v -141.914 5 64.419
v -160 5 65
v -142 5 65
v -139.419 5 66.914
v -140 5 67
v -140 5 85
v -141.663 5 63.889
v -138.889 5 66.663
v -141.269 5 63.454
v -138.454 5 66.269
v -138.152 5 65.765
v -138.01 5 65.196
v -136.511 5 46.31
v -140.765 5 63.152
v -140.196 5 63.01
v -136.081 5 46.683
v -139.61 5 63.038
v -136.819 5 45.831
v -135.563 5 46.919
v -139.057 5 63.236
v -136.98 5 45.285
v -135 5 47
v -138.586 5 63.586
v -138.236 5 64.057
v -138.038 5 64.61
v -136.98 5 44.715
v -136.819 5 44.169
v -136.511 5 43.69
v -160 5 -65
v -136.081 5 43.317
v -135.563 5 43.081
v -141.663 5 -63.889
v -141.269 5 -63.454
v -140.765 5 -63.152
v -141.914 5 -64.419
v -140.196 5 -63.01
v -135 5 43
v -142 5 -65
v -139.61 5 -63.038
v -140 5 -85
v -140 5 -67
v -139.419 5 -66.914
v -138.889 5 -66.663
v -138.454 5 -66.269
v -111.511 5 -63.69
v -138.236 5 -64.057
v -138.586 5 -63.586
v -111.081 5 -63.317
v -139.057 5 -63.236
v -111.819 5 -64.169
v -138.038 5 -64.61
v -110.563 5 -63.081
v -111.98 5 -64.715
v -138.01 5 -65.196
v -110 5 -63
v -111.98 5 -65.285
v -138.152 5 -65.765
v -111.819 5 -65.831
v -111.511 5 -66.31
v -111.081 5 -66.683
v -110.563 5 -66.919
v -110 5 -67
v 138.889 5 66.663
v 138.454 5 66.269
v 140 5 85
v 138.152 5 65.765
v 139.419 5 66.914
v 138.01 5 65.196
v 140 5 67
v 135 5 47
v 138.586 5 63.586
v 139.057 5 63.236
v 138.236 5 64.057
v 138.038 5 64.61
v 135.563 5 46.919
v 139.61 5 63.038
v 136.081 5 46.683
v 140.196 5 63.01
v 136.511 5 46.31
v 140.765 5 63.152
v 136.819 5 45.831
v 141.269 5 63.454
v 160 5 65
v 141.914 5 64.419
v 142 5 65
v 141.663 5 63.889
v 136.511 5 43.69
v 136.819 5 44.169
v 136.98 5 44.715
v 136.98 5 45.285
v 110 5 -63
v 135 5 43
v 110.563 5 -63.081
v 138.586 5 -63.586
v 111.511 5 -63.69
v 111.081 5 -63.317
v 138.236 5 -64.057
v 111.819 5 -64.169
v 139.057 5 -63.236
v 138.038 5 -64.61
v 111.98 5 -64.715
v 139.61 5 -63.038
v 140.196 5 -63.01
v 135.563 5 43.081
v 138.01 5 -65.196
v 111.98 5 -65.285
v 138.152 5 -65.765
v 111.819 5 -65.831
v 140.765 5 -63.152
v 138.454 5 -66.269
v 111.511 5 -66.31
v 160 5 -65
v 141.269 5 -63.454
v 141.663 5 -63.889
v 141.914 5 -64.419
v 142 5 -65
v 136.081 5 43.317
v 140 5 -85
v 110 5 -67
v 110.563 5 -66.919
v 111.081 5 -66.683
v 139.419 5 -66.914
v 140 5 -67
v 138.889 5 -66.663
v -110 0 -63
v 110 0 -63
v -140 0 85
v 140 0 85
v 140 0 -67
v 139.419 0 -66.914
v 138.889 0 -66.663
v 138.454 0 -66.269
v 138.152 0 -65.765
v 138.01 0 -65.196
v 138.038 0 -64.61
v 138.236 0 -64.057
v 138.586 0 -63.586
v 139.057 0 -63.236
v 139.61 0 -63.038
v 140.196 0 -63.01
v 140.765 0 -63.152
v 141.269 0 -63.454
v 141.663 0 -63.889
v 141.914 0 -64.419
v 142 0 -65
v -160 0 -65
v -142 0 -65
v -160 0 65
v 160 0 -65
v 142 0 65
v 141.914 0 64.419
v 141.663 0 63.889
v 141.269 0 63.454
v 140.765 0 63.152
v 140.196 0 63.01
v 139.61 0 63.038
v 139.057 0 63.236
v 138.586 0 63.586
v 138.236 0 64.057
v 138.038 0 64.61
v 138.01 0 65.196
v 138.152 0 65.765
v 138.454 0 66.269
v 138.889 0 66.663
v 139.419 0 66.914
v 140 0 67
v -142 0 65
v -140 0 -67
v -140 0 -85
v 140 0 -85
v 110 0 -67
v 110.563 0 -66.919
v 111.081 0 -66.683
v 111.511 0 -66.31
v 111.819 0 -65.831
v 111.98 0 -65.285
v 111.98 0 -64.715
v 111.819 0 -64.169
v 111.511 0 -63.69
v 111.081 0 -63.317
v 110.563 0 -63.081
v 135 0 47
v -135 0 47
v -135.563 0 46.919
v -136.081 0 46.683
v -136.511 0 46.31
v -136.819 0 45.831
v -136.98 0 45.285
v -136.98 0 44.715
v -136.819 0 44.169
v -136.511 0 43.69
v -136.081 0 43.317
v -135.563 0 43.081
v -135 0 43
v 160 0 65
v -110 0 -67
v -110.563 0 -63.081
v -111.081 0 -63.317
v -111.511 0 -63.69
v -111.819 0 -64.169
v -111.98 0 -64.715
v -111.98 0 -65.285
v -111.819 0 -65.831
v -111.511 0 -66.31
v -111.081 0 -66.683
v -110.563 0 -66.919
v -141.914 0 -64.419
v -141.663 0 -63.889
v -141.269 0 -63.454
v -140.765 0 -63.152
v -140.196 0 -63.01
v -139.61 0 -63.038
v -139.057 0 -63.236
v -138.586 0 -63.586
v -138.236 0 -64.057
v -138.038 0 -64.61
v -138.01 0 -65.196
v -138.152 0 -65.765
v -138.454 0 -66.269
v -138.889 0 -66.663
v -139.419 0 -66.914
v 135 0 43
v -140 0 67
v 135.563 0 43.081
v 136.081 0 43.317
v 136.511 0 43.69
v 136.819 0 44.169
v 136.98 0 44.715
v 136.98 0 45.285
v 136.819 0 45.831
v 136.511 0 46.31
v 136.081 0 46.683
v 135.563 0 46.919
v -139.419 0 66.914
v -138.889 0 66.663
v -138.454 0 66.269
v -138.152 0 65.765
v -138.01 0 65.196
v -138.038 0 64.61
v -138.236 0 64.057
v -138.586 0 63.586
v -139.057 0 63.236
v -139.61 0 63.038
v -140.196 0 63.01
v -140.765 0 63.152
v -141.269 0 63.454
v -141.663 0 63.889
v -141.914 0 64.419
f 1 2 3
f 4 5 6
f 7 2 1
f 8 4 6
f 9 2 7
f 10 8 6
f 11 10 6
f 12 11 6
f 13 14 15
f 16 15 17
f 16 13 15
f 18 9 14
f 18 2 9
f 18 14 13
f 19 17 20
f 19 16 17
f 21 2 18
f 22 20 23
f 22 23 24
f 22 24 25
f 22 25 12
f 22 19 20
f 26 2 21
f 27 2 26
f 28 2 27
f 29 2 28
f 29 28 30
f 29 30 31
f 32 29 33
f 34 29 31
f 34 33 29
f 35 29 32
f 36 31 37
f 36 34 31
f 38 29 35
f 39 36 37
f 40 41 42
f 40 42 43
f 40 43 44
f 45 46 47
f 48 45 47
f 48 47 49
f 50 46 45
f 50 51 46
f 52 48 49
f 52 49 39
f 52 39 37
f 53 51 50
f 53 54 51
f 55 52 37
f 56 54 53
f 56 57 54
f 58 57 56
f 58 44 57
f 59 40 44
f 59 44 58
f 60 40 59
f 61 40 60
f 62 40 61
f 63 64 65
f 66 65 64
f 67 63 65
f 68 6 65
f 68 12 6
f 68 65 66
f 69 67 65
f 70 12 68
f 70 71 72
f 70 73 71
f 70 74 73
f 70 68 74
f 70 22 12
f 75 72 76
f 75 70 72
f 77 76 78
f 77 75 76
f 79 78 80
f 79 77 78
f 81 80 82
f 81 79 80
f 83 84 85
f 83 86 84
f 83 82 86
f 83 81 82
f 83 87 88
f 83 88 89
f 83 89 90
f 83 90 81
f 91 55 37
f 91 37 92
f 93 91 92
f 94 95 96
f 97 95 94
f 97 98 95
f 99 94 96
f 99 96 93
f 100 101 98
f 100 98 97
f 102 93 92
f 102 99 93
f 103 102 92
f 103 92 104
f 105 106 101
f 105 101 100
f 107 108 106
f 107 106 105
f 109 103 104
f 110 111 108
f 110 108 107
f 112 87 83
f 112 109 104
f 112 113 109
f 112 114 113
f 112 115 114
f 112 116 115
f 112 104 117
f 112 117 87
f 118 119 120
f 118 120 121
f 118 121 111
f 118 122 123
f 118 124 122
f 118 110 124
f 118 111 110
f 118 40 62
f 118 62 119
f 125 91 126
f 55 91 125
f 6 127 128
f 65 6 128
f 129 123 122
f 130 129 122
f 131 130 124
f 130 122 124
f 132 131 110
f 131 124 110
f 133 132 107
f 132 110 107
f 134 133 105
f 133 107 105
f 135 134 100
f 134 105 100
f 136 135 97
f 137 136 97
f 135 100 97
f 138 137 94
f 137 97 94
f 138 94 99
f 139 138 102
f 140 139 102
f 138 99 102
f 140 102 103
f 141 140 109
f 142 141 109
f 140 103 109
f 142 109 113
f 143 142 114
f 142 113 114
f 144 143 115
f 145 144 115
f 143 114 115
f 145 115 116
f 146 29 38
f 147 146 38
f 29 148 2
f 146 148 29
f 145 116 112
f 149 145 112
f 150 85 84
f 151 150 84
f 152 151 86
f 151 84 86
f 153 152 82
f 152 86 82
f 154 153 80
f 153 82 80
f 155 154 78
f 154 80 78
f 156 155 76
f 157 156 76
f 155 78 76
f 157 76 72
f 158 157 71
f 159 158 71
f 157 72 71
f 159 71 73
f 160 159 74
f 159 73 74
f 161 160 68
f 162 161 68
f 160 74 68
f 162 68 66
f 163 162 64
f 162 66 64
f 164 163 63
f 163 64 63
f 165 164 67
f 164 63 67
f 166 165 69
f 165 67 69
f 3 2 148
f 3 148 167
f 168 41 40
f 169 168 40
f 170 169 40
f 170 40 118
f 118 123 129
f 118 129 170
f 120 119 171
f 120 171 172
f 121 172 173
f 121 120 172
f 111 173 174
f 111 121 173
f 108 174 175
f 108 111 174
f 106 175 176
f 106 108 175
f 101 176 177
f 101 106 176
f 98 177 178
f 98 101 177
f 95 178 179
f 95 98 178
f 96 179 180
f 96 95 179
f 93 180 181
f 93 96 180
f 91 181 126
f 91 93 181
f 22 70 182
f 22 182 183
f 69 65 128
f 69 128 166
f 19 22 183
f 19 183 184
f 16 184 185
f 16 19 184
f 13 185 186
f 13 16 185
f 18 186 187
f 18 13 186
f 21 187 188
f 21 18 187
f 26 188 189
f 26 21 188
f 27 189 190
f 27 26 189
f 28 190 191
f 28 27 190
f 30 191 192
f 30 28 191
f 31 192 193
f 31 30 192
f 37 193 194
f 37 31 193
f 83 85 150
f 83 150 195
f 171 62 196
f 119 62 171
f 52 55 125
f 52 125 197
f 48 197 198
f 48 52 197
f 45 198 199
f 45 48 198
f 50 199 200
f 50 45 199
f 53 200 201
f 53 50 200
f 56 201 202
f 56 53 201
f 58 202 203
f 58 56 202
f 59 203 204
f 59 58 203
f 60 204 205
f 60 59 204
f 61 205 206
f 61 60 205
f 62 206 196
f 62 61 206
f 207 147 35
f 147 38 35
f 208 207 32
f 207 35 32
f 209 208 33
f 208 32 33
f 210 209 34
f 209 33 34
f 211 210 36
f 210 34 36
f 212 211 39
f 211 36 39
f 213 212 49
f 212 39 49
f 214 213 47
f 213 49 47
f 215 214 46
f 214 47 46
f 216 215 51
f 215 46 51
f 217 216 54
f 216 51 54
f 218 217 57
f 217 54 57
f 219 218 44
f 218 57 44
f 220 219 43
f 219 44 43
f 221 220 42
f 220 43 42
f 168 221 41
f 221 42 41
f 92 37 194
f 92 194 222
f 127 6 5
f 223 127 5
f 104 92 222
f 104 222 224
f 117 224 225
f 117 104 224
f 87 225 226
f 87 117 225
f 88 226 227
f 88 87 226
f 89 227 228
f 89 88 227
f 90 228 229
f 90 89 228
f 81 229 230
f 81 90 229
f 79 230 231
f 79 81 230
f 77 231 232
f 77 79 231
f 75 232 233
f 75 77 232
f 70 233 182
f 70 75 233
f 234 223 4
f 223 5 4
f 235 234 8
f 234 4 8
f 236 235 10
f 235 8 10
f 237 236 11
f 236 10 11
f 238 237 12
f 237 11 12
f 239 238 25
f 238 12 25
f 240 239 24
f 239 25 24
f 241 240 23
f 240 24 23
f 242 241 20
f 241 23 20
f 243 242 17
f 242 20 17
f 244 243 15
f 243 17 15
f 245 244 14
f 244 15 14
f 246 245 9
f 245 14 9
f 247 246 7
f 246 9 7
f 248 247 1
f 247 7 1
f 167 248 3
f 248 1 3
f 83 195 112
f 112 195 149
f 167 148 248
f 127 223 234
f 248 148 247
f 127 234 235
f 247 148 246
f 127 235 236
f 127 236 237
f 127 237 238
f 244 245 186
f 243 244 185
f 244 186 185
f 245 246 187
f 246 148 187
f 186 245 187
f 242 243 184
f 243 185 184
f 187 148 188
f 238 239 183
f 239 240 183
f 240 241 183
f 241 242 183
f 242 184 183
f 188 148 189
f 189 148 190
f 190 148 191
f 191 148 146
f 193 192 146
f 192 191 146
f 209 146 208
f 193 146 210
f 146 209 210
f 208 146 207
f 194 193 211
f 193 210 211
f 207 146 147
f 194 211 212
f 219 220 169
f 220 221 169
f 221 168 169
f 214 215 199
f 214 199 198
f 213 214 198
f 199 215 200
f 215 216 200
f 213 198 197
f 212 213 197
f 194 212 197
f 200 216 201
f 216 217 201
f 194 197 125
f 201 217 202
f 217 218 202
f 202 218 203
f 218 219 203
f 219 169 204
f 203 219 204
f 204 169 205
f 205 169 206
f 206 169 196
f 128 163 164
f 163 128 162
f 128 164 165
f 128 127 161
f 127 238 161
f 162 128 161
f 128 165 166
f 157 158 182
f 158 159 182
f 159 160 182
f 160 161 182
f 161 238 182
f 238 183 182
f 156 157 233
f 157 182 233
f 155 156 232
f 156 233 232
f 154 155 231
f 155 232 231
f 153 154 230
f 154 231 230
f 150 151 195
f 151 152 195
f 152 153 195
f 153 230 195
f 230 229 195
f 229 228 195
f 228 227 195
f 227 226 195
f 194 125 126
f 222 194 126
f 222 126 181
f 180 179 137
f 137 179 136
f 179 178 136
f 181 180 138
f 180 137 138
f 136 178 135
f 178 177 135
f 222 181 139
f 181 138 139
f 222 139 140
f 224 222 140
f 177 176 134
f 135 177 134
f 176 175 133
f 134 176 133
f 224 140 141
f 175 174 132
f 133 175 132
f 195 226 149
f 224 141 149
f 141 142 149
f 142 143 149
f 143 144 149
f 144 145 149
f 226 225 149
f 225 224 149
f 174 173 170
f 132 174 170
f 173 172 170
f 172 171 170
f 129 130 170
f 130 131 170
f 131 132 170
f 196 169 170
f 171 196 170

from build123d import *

# Parameters (mm, degrees)
SKIZZE1_W                       = 320
SKIZZE1_H                       = 170
AUFSATZ_LINEAR_AUSTRAGEN1_DEPTH = 5
SKIZZE2_W                       = 20
SKIZZE2_H                       = 20
SCHNITT_LINEAR_AUSTRAGEN1_DEPTH = 182.245689604
SCHNITT_LINEAR_AUSTRAGEN2_DEPTH = 182.245689604
SKIZZE4_R                       = 2
SCHNITT_LINEAR_AUSTRAGEN3_DEPTH = 182.245689604


with BuildPart() as part:
    # Skizze1 → Aufsatz-Linear austragen1 (new body)
    with BuildSketch(Plane(origin=(0, 0, 0), x_dir=(1, 0, 0), z_dir=(0, 1, 0))):
        Rectangle(SKIZZE1_W, SKIZZE1_H)
    extrude(amount=AUFSATZ_LINEAR_AUSTRAGEN1_DEPTH)

    # Skizze2 → Schnitt-Linear austragen1 (cut, through all)
    with BuildSketch(Plane(origin=(0, 5, 0), x_dir=(1, 0, 0), z_dir=(0, 1, 0))):
        with Locations((-150, 75)):
            Rectangle(SKIZZE2_W, SKIZZE2_H)
        with Locations((150, 75)):
            Rectangle(SKIZZE2_W, SKIZZE2_H)
        with Locations((150, -75)):
            Rectangle(SKIZZE2_W, SKIZZE2_H)
        with Locations((-150, -75)):
            Rectangle(SKIZZE2_W, SKIZZE2_H)
    extrude(amount=-SCHNITT_LINEAR_AUSTRAGEN1_DEPTH, mode=Mode.SUBTRACT)

    # Skizze3 → Schnitt-Linear austragen2 (cut, through all)
    with BuildSketch(Plane(origin=(0, 5, 0), x_dir=(1, 0, 0), z_dir=(0, 1, 0))):
        with BuildLine():
            Line((-110, 67), (110, 67))
            ThreePointArc((110, 67), (112, 65), (110, 63))
            Line((110, 63), (-110, 63))
            ThreePointArc((-110, 63), (-112, 65), (-110, 67))
        make_face()
        with BuildLine():
            Line((-135, -43), (135, -43))
            ThreePointArc((135, -43), (137, -45), (135, -47))
            Line((135, -47), (-135, -47))
            ThreePointArc((-135, -47), (-137, -45), (-135, -43))
        make_face()
    extrude(amount=-SCHNITT_LINEAR_AUSTRAGEN2_DEPTH, mode=Mode.SUBTRACT)

    # Skizze4 → Schnitt-Linear austragen3 (cut, through all)
    with BuildSketch(Plane(origin=(0, 5, 0), x_dir=(1, 0, 0), z_dir=(0, 1, 0))):
        with Locations((-140, 65)):
            Circle(SKIZZE4_R)
        with Locations((-140, -65)):
            Circle(SKIZZE4_R)
        with Locations((140, -65)):
            Circle(SKIZZE4_R)
        with Locations((140, 65)):
            Circle(SKIZZE4_R)
    extrude(amount=-SCHNITT_LINEAR_AUSTRAGEN3_DEPTH, mode=Mode.SUBTRACT)


solid = part.part
